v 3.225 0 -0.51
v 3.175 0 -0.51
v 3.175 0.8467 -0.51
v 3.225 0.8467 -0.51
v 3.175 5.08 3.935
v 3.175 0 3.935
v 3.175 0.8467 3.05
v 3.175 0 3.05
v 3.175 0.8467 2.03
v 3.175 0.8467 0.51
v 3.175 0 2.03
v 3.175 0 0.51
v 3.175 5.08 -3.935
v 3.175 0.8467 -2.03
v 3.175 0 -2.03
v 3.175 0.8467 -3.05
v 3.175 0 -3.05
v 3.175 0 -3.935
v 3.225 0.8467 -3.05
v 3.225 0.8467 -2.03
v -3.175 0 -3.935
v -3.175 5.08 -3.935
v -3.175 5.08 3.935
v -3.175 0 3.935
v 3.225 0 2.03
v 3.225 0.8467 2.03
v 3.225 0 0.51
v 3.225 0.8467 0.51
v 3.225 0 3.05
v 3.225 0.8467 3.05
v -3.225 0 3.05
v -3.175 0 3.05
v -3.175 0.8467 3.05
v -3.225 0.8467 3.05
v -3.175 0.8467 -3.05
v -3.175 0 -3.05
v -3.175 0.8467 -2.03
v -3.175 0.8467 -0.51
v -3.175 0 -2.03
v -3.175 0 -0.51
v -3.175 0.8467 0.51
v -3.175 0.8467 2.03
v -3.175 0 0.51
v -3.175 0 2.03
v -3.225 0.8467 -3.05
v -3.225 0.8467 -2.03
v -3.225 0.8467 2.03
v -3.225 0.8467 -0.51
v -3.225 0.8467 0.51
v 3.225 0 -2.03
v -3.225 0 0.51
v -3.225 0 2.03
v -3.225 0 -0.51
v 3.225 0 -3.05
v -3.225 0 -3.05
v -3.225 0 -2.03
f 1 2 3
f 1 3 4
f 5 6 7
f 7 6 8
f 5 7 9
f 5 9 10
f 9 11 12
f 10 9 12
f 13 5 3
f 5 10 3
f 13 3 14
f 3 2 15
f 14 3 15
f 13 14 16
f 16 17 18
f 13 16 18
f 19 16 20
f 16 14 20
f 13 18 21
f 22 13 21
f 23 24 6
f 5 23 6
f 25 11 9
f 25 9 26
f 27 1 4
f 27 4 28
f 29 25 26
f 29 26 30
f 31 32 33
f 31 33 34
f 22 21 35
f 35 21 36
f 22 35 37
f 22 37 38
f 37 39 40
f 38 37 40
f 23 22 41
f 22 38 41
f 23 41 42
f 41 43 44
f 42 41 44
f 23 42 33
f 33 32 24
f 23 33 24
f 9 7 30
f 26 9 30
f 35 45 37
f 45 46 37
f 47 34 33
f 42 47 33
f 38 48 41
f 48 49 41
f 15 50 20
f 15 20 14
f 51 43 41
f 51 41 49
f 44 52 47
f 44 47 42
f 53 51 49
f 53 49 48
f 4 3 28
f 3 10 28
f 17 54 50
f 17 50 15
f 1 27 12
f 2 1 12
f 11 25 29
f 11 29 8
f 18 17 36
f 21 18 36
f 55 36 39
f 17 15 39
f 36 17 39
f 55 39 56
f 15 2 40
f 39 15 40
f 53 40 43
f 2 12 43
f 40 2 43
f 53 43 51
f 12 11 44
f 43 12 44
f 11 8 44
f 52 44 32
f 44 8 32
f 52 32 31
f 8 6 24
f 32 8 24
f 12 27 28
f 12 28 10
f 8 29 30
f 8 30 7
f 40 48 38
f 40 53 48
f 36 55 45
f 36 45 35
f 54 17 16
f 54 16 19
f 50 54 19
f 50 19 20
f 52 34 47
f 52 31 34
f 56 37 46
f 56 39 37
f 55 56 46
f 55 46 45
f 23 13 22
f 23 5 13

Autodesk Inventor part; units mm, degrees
ref_plane "YZ Plane" through (0, 0, 0) normal (1, 0, 0) x (0, 1, 0)
ref_plane "XZ Plane" through (0, 0, 0) normal (0, 1, 0) x (-1, 0, 0)
ref_plane "XY Plane" through (0, 0, 0) normal (0, 0, 1) x (1, 0, 0)
sketch "Sketch1" plane through (0, 0, 0) normal (0, 1, 0) x (-1, 0, 0)
  line L0 (3.175, 3.935) -> (-3.175, 3.935)
  line L1 (-3.175, 3.935) -> (-3.175, -3.935)
  line L2 (-3.175, -3.935) -> (3.175, -3.935)
  line L3 (3.175, -3.935) -> (3.175, 3.935)
  point P0 (0, 0)
  dimension "d0" = 6.35
  dimension "d1" = 3.175
  dimension "d2" = 7.87
  dimension "d3" = 3.935
extrude "Extrusion1" add sketch "Sketch1" along normal blind 5.08
sketch "Sketch2" plane through (0, 0, 0) normal (0, -1, 0) x (1, 0, 0)
  line L0 (3.225, 0.51) -> (1.955, 0.51)
  line L1 (1.955, 0.51) -> (1.955, -0.51)
  line L2 (1.955, -0.51) -> (3.225, -0.51)
  line L3 (3.225, -0.51) -> (3.225, 0.51)
  line L4 (3.175, 3.935) -> (3.175, -3.935) projected
  point P0 (0, 0)
  dimension "d6" = 1.02
  dimension "d7" = 0.51
  dimension "d8" = 0.05
  dimension "d9" = 1.27
extrude "Extrusion2" add sketch "Sketch2" against normal blind 0.8467
pattern_linear "Rectangular Pattern1" count 3 spacing 2.54 along (0, 0, -1) of "Extrusion2" first direction both ways yes
mirror "Mirror1" about plane through (0, 0, 0) normal (1, 0, 0) of "Extrusion2", "Rectangular Pattern1"
properties part number "MC_TT240"
